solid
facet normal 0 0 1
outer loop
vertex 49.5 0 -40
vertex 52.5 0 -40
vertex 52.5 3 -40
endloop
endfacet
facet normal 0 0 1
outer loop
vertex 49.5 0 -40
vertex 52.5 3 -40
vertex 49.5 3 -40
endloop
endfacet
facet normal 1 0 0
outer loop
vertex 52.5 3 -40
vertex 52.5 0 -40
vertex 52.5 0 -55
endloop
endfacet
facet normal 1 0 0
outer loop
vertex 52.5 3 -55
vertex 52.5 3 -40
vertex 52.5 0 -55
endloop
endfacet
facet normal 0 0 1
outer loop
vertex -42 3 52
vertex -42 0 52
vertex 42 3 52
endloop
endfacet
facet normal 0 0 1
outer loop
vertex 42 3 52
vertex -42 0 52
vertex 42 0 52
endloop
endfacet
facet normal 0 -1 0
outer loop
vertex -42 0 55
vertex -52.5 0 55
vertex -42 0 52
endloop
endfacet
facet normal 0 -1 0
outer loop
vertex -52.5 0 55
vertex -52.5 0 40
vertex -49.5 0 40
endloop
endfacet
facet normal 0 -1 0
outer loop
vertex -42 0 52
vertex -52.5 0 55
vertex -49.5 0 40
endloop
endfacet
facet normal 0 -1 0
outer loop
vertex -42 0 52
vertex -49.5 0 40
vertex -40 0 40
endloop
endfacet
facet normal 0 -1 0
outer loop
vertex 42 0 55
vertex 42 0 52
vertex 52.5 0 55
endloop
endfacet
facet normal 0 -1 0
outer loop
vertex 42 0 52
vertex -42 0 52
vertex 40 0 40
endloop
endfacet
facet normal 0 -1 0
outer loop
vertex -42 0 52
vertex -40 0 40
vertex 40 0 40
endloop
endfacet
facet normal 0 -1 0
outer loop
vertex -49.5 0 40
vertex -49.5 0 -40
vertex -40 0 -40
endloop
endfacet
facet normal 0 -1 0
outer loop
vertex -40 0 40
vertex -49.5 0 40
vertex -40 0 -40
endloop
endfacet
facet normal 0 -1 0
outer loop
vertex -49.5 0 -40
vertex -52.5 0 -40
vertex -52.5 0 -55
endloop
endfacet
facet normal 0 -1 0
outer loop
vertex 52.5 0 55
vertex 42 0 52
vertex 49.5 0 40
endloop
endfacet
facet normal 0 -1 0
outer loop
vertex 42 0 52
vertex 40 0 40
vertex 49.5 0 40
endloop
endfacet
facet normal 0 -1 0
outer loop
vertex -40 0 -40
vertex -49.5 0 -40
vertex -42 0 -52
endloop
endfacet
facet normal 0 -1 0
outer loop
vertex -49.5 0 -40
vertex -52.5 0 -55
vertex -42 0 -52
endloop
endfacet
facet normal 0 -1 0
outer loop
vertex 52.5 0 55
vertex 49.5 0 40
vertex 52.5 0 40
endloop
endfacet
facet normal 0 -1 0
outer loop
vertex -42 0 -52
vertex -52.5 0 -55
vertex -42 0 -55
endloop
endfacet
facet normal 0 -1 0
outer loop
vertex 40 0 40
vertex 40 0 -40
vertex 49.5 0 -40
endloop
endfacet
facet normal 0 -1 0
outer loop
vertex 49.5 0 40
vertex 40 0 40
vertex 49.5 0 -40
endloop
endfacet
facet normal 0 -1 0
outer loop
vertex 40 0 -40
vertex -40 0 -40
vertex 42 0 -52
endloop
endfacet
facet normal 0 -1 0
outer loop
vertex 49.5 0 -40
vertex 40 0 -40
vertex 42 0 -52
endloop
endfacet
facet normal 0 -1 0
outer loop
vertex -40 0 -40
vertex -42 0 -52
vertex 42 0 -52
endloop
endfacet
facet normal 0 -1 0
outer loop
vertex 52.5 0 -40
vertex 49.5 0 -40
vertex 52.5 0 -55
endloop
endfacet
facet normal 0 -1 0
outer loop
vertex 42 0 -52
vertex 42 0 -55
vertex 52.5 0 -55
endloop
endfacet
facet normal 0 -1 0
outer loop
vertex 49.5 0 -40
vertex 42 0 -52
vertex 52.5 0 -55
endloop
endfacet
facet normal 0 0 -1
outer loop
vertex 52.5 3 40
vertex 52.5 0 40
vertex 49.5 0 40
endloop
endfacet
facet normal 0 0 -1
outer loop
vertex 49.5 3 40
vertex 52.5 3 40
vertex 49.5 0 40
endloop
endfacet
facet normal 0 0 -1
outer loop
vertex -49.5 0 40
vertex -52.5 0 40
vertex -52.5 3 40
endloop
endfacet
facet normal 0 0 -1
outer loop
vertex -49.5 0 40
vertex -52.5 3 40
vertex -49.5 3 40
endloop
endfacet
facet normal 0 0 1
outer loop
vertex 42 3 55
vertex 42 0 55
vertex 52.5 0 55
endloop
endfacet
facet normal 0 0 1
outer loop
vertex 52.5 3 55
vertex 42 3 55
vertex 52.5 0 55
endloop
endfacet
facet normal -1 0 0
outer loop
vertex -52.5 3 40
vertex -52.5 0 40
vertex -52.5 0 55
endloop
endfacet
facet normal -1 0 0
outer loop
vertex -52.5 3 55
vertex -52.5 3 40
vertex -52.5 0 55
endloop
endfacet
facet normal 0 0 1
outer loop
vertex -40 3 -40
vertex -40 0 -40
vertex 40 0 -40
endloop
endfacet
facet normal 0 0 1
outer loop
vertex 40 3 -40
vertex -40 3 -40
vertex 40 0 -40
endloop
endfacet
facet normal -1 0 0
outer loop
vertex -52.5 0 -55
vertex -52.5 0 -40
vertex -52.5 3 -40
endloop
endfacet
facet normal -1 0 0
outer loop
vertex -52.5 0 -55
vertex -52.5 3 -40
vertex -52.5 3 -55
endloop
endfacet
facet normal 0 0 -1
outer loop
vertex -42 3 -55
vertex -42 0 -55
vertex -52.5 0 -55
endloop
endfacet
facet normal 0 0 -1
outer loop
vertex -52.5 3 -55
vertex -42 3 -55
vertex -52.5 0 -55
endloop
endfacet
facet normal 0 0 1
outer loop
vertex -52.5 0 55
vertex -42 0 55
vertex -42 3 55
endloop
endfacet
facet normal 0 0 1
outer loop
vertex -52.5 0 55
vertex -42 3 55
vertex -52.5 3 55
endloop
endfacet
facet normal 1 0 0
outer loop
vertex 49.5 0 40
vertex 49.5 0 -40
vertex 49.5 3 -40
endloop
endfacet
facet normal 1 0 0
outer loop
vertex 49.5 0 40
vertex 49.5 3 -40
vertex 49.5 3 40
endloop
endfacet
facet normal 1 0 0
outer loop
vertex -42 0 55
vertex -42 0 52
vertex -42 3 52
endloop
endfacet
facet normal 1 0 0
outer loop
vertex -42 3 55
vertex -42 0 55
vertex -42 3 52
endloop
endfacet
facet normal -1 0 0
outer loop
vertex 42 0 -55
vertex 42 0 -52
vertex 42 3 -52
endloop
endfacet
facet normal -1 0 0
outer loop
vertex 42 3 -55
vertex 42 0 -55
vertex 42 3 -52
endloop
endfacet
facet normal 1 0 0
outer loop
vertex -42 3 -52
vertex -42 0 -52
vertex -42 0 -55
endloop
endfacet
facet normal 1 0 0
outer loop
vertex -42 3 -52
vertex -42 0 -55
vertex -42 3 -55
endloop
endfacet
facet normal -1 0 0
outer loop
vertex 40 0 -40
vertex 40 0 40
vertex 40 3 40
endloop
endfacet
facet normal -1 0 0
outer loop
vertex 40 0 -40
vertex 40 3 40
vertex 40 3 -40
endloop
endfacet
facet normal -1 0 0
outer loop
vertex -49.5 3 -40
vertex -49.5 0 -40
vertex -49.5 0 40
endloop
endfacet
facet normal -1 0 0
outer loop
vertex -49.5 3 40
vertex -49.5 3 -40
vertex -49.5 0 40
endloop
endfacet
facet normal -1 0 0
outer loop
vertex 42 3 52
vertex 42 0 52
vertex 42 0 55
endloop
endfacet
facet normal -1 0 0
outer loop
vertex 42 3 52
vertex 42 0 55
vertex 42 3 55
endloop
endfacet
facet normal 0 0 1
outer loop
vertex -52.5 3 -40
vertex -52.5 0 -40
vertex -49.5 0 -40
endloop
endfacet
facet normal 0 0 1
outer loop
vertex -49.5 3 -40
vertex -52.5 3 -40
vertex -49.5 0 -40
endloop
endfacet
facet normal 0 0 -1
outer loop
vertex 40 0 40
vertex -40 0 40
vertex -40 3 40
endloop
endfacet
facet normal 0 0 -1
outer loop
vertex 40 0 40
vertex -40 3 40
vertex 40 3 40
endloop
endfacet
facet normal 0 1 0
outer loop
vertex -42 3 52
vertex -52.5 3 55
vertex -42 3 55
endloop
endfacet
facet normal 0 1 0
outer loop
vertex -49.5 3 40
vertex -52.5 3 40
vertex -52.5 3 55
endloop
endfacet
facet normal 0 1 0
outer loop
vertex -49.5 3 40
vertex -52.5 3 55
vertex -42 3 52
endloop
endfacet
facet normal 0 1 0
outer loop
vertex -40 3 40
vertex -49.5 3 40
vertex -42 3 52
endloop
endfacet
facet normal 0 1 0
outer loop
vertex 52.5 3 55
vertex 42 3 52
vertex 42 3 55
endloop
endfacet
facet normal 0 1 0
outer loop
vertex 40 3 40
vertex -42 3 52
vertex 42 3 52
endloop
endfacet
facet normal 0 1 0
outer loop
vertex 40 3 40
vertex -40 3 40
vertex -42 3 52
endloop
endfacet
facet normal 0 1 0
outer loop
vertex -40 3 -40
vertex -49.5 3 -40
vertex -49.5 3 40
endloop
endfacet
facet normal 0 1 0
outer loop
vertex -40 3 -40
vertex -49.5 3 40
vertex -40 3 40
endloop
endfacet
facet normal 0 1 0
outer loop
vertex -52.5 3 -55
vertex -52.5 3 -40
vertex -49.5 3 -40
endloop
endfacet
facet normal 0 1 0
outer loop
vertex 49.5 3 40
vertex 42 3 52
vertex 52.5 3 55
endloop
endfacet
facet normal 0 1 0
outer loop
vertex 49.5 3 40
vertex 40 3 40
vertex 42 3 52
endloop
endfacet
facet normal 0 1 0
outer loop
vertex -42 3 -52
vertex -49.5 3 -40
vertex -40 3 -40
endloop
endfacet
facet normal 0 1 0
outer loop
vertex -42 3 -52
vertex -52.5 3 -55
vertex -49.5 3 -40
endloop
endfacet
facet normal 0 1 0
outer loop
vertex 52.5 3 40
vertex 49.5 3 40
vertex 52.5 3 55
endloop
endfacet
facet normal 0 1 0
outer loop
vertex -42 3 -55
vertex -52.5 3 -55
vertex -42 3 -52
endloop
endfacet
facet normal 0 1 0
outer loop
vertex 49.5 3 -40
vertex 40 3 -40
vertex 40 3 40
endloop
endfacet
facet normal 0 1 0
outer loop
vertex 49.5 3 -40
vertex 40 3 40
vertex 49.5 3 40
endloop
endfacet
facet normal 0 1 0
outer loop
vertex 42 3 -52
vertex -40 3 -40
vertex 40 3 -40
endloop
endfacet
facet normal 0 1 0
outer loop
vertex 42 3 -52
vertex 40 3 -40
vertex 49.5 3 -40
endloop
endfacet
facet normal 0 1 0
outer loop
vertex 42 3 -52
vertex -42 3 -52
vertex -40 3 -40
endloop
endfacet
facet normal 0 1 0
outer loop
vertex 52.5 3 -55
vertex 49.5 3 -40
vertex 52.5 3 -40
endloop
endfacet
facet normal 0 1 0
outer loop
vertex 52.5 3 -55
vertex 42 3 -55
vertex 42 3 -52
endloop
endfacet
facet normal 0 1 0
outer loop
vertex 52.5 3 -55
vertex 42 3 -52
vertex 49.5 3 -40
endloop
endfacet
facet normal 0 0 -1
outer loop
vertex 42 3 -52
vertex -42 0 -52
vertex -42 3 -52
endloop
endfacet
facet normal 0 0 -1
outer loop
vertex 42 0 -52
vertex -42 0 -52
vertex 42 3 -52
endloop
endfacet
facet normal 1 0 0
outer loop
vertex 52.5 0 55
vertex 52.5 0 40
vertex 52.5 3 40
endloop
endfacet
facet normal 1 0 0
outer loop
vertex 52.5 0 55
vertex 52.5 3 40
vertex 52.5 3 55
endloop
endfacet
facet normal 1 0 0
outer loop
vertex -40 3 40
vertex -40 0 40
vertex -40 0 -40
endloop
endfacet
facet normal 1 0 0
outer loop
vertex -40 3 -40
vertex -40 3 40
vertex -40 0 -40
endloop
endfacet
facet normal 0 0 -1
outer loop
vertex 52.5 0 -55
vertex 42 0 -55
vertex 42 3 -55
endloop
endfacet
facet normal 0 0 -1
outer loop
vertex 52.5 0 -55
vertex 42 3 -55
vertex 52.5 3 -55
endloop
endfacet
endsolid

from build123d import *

# Parameters (mm, degrees)
SKETCH2_W               = 109
SKETCH2_H               = 104
SKETCH2_W_2             = 80
SKETCH2_H_2             = 80
BOSS_EXTRUDE2_DEPTH     = 3
SKETCH3_W               = 12.5
SKETCH3_H               = 3
BOSS_EXTRUDE3_DEPTH     = 5
SKETCH4_W               = 5
SKETCH4_H               = 80
CUT_EXTRUDE1_DEPTH      = 5
SKETCH5_W               = 10.5
SKETCH5_H               = 2
CUT_EXTRUDE2_DEPTH      = 10
MIRROR5_COPY_1_SKETCH_W = 10.5
MIRROR5_COPY_1_SKETCH_H = 2
MIRROR5_COPY_1_DEPTH    = 10


with BuildPart() as part:
    # Sketch2 → Boss-Extrude2 (new body)
    with BuildSketch(Plane(origin=(0, 0, 0), x_dir=(1, 0, 0), z_dir=(0, 1, 0))):
        Rectangle(SKETCH2_W, SKETCH2_H)
        Rectangle(SKETCH2_W_2, SKETCH2_H_2, mode=Mode.SUBTRACT)
    extrude(amount=BOSS_EXTRUDE2_DEPTH)

    # Sketch3 → Boss-Extrude3 (add)
    with BuildSketch(Plane(origin=(0, 0, -52), x_dir=(-1, 0, 0), z_dir=(0, 0, -1))):
        with Locations((48.25, 1.5)):
            Rectangle(SKETCH3_W, SKETCH3_H)
    extrude(amount=BOSS_EXTRUDE3_DEPTH)

    # Mirror1: part across plane


with BuildPart() as part_1:
    add(part.part)
    add(part.part.mirror(Plane.XY))

    # Mirror2: part across plane


with BuildPart() as part_2:
    add(part_1.part)
    add(part_1.part.mirror(Plane(origin=(0, 0, 0), x_dir=(0, 0, 1), z_dir=(1, 0, 0))))

    # Sketch4 → Cut-Extrude1 (cut)
    with BuildSketch(Plane.XZ):
        with Locations((-52, 0)):
            Rectangle(SKETCH4_W, SKETCH4_H)
    cut_extrude1 = extrude(amount=-CUT_EXTRUDE1_DEPTH, mode=Mode.SUBTRACT)

    # Mirror3: Cut-Extrude1 across plane
    add(cut_extrude1.mirror(Plane(origin=(0, 0, 0), x_dir=(0, 0, 1), z_dir=(1, 0, 0))), mode=Mode.SUBTRACT)

    # Sketch5 → Cut-Extrude2 (cut)
    with BuildSketch(Plane.XZ):
        with Locations((47.25, -56)):
            Rectangle(SKETCH5_W, SKETCH5_H)
        Polygon((54.5, -57), (54.5, -40), (52.5, -40), (52.5, -55), (52.5, -57), align=None)
    cut_extrude2 = extrude(amount=-CUT_EXTRUDE2_DEPTH, mode=Mode.SUBTRACT)

    # Mirror4: Cut-Extrude2 across plane
    add(cut_extrude2.mirror(Plane(origin=(0, 0, 0), x_dir=(0, 0, 1), z_dir=(1, 0, 0))), mode=Mode.SUBTRACT)

    # Mirror5: Cut-Extrude2 across plane
    add(cut_extrude2.mirror(Plane.XY), mode=Mode.SUBTRACT)

    # Mirror5 copy 1 sketch → Mirror5 copy 1 (cut)
    with BuildSketch(Plane(origin=(0, 0, 0), x_dir=(-1, 0, 0), z_dir=(0, -1, 0))):
        with Locations((47.25, -56)):
            Rectangle(MIRROR5_COPY_1_SKETCH_W, MIRROR5_COPY_1_SKETCH_H)
        Polygon((54.5, -57), (54.5, -40), (52.5, -40), (52.5, -55), (52.5, -57), align=None)
    extrude(amount=-MIRROR5_COPY_1_DEPTH, mode=Mode.SUBTRACT)


solid = part_2.part
